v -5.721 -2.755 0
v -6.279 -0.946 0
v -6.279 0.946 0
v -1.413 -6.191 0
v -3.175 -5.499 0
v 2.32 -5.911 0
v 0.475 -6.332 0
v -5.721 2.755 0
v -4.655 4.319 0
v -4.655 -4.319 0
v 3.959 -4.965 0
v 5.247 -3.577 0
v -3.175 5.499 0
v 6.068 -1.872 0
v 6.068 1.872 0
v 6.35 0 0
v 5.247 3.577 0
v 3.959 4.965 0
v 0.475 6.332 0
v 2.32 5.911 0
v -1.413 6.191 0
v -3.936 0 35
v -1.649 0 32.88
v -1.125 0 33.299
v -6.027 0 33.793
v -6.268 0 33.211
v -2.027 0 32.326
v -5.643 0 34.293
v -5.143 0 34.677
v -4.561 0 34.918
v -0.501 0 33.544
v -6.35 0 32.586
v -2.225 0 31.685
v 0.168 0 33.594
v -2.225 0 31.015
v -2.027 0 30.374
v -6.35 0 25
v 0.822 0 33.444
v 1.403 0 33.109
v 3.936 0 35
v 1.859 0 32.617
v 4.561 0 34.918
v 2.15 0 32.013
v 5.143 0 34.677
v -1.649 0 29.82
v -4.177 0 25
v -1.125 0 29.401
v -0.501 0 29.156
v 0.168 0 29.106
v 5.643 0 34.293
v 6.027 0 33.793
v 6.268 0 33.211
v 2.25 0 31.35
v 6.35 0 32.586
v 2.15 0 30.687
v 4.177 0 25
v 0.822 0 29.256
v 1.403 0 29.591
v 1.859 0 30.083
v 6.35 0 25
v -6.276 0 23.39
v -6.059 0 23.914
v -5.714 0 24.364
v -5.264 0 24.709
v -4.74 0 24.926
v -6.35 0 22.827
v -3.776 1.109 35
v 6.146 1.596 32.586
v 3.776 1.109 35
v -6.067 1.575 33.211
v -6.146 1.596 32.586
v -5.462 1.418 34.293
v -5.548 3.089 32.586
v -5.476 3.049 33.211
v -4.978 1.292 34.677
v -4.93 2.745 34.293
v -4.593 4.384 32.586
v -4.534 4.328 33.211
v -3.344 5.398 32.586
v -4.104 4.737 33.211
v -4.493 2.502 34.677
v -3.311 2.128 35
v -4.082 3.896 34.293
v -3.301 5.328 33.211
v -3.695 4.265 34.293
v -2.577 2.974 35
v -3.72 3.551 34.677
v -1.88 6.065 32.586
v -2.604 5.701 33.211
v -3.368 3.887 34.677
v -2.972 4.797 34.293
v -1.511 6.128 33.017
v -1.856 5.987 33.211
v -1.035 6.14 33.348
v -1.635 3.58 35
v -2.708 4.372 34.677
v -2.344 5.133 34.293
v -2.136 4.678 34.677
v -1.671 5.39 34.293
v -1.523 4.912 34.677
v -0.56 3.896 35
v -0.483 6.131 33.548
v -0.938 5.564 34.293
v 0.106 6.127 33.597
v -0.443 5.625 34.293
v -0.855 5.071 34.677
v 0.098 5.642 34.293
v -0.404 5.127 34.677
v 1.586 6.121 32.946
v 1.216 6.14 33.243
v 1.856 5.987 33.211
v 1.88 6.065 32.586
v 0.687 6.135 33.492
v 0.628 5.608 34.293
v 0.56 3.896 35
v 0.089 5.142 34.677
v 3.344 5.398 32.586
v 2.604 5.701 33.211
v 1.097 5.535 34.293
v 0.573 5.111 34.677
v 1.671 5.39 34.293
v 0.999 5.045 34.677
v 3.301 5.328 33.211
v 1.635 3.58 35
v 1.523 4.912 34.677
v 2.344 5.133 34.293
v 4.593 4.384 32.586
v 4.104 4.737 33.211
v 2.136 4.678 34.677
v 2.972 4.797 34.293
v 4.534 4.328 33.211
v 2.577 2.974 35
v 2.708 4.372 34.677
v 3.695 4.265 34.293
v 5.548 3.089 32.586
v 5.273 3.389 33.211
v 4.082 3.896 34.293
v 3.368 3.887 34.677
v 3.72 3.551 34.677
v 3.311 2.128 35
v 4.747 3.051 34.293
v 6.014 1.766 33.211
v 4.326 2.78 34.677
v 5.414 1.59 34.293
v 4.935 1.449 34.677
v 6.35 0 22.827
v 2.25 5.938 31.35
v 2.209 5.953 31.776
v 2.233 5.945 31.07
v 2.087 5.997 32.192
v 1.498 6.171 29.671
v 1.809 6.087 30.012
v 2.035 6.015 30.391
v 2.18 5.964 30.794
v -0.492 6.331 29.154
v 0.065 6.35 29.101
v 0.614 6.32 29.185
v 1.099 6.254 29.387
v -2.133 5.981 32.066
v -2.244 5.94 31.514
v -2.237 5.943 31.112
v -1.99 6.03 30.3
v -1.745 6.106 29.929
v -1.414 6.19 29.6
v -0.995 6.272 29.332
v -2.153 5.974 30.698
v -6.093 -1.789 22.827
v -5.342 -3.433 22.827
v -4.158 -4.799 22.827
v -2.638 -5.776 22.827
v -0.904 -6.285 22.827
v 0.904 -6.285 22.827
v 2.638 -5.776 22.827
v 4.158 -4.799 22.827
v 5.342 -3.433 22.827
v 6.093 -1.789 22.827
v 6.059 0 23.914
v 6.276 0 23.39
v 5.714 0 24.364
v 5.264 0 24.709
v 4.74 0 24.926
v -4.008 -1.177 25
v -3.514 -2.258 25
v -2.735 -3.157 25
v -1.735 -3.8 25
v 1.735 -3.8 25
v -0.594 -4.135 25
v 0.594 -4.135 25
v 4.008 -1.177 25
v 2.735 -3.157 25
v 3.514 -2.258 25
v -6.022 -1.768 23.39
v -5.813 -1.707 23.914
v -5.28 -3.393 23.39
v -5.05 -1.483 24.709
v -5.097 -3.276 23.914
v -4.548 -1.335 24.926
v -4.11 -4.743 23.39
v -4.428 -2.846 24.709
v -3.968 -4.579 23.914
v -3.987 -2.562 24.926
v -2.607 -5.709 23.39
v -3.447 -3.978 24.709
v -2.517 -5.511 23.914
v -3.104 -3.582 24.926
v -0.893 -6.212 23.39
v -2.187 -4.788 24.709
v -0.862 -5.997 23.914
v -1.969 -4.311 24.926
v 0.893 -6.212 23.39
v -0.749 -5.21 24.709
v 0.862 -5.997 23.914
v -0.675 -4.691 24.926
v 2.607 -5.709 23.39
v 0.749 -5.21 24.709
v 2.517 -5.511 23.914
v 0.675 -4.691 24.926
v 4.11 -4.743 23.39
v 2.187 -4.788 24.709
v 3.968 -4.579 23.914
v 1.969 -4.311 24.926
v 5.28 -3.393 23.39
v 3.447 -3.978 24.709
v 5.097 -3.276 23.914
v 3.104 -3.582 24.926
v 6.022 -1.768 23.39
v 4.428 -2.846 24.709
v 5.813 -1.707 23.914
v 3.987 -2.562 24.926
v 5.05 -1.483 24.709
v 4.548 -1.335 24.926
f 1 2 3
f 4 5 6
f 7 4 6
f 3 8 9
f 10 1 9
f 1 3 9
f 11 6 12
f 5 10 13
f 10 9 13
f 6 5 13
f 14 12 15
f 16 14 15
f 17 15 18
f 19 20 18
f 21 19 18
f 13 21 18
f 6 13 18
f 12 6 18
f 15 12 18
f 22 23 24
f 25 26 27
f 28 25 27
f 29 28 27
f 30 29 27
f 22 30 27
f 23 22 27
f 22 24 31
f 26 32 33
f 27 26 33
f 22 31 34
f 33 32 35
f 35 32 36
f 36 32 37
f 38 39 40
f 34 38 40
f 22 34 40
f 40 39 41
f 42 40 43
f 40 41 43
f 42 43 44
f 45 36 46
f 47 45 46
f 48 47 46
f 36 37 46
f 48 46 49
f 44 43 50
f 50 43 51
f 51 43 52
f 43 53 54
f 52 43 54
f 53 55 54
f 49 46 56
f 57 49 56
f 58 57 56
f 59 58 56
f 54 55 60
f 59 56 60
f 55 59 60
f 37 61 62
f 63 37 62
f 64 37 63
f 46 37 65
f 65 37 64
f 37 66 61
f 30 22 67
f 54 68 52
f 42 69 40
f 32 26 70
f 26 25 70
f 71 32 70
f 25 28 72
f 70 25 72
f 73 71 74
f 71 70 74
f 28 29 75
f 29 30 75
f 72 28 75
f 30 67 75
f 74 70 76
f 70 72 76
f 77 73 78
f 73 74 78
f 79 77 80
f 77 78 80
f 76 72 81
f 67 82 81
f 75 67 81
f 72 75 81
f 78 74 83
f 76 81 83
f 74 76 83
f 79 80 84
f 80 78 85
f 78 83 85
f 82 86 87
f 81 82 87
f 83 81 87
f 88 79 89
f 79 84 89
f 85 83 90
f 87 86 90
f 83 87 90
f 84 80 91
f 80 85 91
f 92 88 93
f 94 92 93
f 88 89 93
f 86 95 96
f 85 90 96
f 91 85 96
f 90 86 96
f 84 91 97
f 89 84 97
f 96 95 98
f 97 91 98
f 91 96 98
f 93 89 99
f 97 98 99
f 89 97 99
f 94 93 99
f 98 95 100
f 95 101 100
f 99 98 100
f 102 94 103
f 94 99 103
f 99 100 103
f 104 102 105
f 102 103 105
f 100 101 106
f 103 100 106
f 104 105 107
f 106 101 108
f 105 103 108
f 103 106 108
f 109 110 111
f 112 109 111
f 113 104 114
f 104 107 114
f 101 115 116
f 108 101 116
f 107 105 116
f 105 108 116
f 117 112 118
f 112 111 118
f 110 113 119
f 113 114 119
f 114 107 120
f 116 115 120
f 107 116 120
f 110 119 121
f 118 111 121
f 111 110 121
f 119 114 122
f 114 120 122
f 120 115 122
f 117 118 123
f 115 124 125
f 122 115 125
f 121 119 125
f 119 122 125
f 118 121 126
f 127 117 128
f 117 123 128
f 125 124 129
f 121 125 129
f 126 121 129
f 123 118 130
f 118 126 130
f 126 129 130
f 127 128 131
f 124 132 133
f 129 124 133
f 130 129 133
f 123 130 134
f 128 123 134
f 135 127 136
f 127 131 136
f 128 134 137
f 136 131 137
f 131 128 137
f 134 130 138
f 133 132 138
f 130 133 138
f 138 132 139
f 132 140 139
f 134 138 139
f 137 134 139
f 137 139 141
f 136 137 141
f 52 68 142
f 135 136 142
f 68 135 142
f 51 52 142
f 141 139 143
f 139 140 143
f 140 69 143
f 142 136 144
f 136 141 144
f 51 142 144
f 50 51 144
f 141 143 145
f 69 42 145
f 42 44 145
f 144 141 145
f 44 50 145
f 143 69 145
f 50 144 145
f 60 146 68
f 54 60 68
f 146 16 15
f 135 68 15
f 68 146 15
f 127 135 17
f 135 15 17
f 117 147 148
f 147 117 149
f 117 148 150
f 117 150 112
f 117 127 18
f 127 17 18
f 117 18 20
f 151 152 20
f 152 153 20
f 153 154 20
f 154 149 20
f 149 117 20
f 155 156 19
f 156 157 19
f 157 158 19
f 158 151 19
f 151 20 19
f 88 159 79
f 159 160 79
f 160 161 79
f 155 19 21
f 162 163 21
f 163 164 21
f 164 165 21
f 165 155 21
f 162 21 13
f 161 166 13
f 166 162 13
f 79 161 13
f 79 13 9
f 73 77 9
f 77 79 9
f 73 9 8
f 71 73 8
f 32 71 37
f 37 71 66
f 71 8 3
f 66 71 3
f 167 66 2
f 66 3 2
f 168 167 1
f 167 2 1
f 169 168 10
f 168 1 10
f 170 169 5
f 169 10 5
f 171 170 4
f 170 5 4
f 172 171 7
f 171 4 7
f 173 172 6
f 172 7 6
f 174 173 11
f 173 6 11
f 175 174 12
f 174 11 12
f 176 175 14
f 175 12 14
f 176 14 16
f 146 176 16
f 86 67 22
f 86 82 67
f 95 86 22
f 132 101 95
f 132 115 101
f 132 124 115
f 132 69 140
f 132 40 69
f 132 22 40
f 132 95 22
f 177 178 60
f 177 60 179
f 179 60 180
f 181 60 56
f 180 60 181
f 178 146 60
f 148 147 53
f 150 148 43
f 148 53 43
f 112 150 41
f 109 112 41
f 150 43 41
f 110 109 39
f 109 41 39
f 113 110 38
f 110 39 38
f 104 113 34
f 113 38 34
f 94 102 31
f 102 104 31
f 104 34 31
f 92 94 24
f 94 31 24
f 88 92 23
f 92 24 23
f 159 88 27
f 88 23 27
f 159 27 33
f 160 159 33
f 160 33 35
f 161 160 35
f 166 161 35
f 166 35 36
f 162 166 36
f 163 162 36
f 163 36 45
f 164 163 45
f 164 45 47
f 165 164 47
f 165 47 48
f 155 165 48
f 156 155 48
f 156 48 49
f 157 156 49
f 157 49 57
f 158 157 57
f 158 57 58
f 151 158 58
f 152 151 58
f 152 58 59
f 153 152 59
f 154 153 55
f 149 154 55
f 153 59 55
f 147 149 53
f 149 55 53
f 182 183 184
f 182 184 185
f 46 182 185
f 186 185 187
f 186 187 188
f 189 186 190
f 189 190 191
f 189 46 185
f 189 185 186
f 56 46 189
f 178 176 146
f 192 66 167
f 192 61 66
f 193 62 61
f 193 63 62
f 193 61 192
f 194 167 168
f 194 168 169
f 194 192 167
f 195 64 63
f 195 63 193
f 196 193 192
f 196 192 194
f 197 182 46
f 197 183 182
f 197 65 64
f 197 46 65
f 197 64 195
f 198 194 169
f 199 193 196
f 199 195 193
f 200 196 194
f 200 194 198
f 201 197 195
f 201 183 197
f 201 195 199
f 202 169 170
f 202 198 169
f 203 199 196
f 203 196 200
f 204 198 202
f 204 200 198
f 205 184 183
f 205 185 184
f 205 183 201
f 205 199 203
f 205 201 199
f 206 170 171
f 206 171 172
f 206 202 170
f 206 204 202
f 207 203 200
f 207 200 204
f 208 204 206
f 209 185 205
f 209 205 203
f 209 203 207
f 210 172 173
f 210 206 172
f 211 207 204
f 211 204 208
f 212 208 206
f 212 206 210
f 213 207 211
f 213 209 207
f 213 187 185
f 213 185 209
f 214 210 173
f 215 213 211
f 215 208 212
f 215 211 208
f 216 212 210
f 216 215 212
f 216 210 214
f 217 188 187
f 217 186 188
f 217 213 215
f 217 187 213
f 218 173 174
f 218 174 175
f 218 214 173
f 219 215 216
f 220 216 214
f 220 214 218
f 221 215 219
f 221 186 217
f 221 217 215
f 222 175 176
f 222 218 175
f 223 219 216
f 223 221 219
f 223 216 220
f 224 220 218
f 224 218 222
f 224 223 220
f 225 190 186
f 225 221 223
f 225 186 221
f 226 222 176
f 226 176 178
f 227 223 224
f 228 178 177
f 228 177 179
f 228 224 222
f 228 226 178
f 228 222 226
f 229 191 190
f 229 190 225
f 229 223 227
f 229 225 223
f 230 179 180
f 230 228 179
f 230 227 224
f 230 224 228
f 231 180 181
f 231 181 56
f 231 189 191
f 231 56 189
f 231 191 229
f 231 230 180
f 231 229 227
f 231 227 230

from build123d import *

# Parameters (mm, degrees)
F0_R        = 6.35
F1_DEPTH    = 25
F3_DEPTH    = 12.7
F4_R        = 2.25
F5_DEPTH    = 25
F6_W        = 18.3003712445
F6_H        = 9.7342398949
F7_DEPTH    = 2.7
F8_T2_ANGLE = 289.0918893802
F9_T2_ANGLE = 180


# Not quite as in the source:
# - a fillet or chamfer that OpenCascade refuses, or shapes differently, is made with other operations: its cross-section is extruded or revolved along the edge and cut away or added


with BuildPart() as f1:
    # F0 (on Top) → F1 (new body)
    with BuildSketch(Plane.XY):
        Circle(F0_R)
    extrude(amount=F1_DEPTH)

    # F2 (on face) → F3 (join)
    with BuildSketch(Plane.XY.offset(25)):
        with BuildLine():
            Line((-6.35, 0), (6.35, 0))
            ThreePointArc((6.35, 0), (0, 6.35), (-6.35, 0))
        make_face()
    extrude(amount=F3_DEPTH)

    # F4 (on face) → F5 (cut)
    with BuildSketch(Plane.XZ):
        with Locations((0, 31.35)):
            Circle(F4_R)
    extrude(amount=-F5_DEPTH, mode=Mode.SUBTRACT)

    # F6 (on face) → F7 (cut)
    with BuildSketch(Plane.XY.offset(37.7)):
        with Locations((0, 3.4640058875)):
            Rectangle(F6_W, F6_H)
    extrude(amount=-F7_DEPTH, mode=Mode.SUBTRACT)

    # F8: fillet of radius 2.4142135624 on 1 edges, made by hand

    # F8_s1 → F8_t2 (revolve, cut)
    with BuildSketch(Plane(origin=(0, 0, 0), x_dir=(0, 0, 1), z_dir=(0.8145809142, -0.5800499411, 0))):
        with BuildLine():
            ThreePointArc((32.5857864376, 6.35), (34.2928932188, 5.6428932188), (35, 3.9357864376))
            Line((35, 3.9357864376), (35, 6.35))
            Line((35, 6.35), (32.5857864376, 6.35))
        make_face()
    revolve(axis=Axis((0, 0, 35), (0, 0, -1)), revolution_arc=F8_T2_ANGLE, mode=Mode.SUBTRACT)

    # F9: fillet of radius 2.1727922061 on 1 edges, made by hand

    # F9_s1 → F9_t2 (revolve, cut)
    with BuildSketch(Plane.XZ):
        with BuildLine():
            ThreePointArc((-6.35, 22.8272077939), (-5.7136038969, 24.3636038969), (-4.1772077939, 25))
            Line((-4.1772077939, 25), (-6.35, 25))
            Line((-6.35, 25), (-6.35, 22.8272077939))
        make_face()
    revolve(axis=Axis((0, 0, 25), (0, 0, 1)), revolution_arc=F9_T2_ANGLE, mode=Mode.SUBTRACT)


solid = f1.part
